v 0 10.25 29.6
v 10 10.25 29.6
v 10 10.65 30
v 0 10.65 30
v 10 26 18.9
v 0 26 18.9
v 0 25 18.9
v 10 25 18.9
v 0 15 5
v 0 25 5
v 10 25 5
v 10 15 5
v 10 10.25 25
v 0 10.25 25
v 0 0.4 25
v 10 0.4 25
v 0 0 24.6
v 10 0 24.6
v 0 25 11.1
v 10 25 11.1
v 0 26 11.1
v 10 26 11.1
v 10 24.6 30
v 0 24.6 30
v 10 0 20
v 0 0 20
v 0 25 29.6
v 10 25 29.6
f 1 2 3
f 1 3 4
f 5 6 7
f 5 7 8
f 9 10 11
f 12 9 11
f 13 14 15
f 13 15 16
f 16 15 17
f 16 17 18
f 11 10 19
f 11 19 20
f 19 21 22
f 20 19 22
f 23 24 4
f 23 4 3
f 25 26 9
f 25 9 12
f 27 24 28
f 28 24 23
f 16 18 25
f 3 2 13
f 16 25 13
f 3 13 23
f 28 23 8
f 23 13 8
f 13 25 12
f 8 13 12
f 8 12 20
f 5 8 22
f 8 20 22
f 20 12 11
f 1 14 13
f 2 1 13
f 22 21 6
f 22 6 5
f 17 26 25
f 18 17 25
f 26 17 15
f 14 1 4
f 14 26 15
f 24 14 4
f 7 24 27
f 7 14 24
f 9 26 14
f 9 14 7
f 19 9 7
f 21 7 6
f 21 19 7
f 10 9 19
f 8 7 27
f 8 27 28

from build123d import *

# Parameters (mm, degrees)
BOX012_W        = 10
BOX012_H        = 2
BOX012_DEPTH    = 7.8
BOX013_W        = 10
BOX013_H        = 25
BOX013_DEPTH    = 25
BOX011_W        = 10
BOX011_H        = 25
BOX011_DEPTH    = 25
CHAMFER_SIZE    = 15
CHAMFER001_SIZE = 0.4


with BuildPart() as cube011:
    # Box012 → Box012 (new body)
    with BuildSketch(Plane(origin=(0, 24, 11.1), x_dir=(1, 0, 0), z_dir=(0, 0, 1))):
        with Locations((5, 1)):
            Rectangle(BOX012_W, BOX012_H)
    extrude(amount=BOX012_DEPTH)


with BuildPart() as cube012:
    # Box013 → Box013 (new body)
    with BuildSketch(Plane(origin=(0, -14.75, 25), x_dir=(1, 0, 0), z_dir=(0, 0, 1))):
        with Locations((5, 12.5)):
            Rectangle(BOX013_W, BOX013_H)
    extrude(amount=BOX013_DEPTH)


with BuildPart() as support_profile:
    # Box011 → Box011 (new body)
    with BuildSketch(Plane.XY.offset(5)):
        with Locations((5, 12.5)):
            Rectangle(BOX011_W, BOX011_H)
    extrude(amount=BOX011_DEPTH)

    # Cut001: cut Cube012
    add(cube012.part, mode=Mode.SUBTRACT)

    # Chamfer
    chamfer_edges = [support_profile.edges().sort_by_distance(p)[0] for p in [
        (5, 0, 5),
    ]]
    chamfer(chamfer_edges, length=CHAMFER_SIZE)

    # Chamfer001
    chamfer001_edges = [support_profile.edges().sort_by_distance(p)[0] for p in [
        (5, 0, 25),
        (5, 10.25, 30),
        (5, 25, 30),
    ]]
    chamfer(chamfer001_edges, length=CHAMFER001_SIZE)

    # Fusion001002: union Cube011
    add(cube011.part)


solid = support_profile.part
